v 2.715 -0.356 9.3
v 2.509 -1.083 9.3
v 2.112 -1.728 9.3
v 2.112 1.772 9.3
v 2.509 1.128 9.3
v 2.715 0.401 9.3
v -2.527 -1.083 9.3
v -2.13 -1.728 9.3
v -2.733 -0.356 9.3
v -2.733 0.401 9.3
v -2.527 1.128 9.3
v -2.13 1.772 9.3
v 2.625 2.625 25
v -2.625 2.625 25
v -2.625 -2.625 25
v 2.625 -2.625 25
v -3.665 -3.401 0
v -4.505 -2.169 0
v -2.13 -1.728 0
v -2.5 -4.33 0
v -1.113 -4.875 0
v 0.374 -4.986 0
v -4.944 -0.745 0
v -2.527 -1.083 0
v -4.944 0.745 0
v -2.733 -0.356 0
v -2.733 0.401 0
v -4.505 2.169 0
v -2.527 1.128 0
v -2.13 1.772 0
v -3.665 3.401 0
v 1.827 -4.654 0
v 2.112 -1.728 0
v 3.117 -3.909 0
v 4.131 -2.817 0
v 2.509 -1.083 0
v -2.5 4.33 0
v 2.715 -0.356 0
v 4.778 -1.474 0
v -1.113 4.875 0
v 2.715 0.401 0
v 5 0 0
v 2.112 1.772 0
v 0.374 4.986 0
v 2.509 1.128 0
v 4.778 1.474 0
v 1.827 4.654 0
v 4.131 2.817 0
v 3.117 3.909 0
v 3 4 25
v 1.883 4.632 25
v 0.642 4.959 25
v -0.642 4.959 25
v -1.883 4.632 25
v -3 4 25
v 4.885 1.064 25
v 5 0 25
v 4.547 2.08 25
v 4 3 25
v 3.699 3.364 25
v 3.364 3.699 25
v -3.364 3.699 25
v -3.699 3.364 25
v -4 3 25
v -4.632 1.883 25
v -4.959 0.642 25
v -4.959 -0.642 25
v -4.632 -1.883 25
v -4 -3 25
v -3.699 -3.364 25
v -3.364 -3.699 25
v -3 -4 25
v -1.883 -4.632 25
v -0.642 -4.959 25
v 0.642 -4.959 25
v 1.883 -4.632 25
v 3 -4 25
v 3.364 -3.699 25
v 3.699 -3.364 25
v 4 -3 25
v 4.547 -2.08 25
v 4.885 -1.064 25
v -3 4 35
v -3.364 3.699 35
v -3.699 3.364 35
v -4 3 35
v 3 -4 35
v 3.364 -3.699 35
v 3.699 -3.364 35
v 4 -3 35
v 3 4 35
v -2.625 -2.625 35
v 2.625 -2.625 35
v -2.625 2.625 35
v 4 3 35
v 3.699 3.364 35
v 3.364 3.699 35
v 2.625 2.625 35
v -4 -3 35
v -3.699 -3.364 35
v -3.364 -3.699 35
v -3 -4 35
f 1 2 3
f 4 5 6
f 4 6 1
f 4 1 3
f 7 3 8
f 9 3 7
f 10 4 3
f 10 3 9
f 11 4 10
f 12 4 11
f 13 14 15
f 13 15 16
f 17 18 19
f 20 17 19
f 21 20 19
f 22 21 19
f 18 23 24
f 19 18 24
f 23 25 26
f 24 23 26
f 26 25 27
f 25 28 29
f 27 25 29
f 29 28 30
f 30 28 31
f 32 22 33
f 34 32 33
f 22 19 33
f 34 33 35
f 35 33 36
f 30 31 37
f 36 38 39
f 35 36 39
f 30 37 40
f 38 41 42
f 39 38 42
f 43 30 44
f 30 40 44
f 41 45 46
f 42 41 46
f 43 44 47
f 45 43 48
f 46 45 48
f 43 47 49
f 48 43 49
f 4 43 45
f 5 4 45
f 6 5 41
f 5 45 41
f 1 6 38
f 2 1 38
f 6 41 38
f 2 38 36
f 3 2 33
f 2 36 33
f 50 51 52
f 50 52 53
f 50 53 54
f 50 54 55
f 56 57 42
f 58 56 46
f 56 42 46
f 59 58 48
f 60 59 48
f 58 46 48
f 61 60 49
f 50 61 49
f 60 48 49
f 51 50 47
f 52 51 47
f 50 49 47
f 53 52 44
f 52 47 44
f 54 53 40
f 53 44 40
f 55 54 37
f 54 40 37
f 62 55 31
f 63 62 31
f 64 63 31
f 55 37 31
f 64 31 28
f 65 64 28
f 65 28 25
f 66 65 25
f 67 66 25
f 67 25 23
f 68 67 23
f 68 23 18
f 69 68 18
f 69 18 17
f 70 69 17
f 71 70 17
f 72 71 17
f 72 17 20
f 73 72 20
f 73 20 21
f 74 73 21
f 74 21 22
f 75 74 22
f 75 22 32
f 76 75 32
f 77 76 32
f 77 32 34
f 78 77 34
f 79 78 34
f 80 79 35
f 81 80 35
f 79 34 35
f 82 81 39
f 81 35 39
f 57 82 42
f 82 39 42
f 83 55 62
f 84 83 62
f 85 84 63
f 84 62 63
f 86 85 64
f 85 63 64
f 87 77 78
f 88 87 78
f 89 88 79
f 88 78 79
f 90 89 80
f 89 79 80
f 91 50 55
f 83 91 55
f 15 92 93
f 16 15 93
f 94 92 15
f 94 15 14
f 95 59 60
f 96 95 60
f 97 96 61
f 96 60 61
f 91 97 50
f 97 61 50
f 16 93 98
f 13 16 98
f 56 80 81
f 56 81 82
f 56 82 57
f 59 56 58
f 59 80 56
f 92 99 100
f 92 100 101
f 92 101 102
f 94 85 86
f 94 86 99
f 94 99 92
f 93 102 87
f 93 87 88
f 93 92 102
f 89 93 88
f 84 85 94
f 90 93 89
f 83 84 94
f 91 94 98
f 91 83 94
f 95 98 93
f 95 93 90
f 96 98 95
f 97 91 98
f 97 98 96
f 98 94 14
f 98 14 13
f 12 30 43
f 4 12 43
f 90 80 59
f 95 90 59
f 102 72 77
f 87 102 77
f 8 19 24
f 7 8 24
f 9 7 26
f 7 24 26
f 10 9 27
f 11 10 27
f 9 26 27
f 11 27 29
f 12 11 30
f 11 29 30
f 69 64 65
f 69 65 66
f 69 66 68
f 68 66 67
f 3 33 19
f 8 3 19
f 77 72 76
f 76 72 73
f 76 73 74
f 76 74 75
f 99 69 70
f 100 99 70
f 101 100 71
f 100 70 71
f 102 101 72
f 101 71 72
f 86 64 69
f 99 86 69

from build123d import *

# Parameters (mm, degrees)
SKETCH1_R           = 5
BOSS_EXTRUDE1_DEPTH = 25
CUT_EXTRUDE1_DEPTH  = 9.3
BOSS_EXTRUDE2_DEPTH = 10
SKETCH4_W           = 5.25
SKETCH4_H           = 5.25
CUT_EXTRUDE2_DEPTH  = 10


with BuildPart() as part:
    # Sketch1 → Boss-Extrude1 (new body)
    with BuildSketch(Plane.XY):
        Circle(SKETCH1_R)
    extrude(amount=BOSS_EXTRUDE1_DEPTH)

    # Sketch2 → Cut-Extrude1 (cut)
    with BuildSketch(Plane(origin=(0, 0, 0), x_dir=(-1, 0, 0), z_dir=(0, 0, -1))):
        with BuildLine():
            Line((-2.112335797, -1.727538634), (2.13030489, -1.727538634))
            ThreePointArc((2.13030489, -1.727538634), (2.758984546, 0.022461366), (2.13030489, 1.772461366))
            Line((2.13030489, 1.772461366), (-2.112335797, 1.772461366))
            ThreePointArc((-2.112335797, 1.772461366), (-2.741015454, 0.022461366), (-2.112335797, -1.727538634))
        make_face()
    extrude(amount=-CUT_EXTRUDE1_DEPTH, mode=Mode.SUBTRACT)

    # Sketch3 → Boss-Extrude2 (add)
    with BuildSketch(Plane.XY.offset(25)):
        with BuildLine():
            ThreePointArc((-4, -3), (-3.535533906, -3.535533906), (-3, -4))
            Line((-3, -4), (3, -4))
            ThreePointArc((3, -4), (3.535533906, -3.535533906), (4, -3))
            Line((4, -3), (4, 3))
            ThreePointArc((4, 3), (3.535533906, 3.535533906), (3, 4))
            Line((3, 4), (-3, 4))
            ThreePointArc((-3, 4), (-3.535533906, 3.535533906), (-4, 3))
            Line((-4, 3), (-4, -3))
        make_face()
    extrude(amount=BOSS_EXTRUDE2_DEPTH)

    # Sketch4 → Cut-Extrude2 (cut)
    with BuildSketch(Plane.XY.offset(35)):
        Rectangle(SKETCH4_W, SKETCH4_H)
    extrude(amount=-CUT_EXTRUDE2_DEPTH, mode=Mode.SUBTRACT)


solid = part.part
